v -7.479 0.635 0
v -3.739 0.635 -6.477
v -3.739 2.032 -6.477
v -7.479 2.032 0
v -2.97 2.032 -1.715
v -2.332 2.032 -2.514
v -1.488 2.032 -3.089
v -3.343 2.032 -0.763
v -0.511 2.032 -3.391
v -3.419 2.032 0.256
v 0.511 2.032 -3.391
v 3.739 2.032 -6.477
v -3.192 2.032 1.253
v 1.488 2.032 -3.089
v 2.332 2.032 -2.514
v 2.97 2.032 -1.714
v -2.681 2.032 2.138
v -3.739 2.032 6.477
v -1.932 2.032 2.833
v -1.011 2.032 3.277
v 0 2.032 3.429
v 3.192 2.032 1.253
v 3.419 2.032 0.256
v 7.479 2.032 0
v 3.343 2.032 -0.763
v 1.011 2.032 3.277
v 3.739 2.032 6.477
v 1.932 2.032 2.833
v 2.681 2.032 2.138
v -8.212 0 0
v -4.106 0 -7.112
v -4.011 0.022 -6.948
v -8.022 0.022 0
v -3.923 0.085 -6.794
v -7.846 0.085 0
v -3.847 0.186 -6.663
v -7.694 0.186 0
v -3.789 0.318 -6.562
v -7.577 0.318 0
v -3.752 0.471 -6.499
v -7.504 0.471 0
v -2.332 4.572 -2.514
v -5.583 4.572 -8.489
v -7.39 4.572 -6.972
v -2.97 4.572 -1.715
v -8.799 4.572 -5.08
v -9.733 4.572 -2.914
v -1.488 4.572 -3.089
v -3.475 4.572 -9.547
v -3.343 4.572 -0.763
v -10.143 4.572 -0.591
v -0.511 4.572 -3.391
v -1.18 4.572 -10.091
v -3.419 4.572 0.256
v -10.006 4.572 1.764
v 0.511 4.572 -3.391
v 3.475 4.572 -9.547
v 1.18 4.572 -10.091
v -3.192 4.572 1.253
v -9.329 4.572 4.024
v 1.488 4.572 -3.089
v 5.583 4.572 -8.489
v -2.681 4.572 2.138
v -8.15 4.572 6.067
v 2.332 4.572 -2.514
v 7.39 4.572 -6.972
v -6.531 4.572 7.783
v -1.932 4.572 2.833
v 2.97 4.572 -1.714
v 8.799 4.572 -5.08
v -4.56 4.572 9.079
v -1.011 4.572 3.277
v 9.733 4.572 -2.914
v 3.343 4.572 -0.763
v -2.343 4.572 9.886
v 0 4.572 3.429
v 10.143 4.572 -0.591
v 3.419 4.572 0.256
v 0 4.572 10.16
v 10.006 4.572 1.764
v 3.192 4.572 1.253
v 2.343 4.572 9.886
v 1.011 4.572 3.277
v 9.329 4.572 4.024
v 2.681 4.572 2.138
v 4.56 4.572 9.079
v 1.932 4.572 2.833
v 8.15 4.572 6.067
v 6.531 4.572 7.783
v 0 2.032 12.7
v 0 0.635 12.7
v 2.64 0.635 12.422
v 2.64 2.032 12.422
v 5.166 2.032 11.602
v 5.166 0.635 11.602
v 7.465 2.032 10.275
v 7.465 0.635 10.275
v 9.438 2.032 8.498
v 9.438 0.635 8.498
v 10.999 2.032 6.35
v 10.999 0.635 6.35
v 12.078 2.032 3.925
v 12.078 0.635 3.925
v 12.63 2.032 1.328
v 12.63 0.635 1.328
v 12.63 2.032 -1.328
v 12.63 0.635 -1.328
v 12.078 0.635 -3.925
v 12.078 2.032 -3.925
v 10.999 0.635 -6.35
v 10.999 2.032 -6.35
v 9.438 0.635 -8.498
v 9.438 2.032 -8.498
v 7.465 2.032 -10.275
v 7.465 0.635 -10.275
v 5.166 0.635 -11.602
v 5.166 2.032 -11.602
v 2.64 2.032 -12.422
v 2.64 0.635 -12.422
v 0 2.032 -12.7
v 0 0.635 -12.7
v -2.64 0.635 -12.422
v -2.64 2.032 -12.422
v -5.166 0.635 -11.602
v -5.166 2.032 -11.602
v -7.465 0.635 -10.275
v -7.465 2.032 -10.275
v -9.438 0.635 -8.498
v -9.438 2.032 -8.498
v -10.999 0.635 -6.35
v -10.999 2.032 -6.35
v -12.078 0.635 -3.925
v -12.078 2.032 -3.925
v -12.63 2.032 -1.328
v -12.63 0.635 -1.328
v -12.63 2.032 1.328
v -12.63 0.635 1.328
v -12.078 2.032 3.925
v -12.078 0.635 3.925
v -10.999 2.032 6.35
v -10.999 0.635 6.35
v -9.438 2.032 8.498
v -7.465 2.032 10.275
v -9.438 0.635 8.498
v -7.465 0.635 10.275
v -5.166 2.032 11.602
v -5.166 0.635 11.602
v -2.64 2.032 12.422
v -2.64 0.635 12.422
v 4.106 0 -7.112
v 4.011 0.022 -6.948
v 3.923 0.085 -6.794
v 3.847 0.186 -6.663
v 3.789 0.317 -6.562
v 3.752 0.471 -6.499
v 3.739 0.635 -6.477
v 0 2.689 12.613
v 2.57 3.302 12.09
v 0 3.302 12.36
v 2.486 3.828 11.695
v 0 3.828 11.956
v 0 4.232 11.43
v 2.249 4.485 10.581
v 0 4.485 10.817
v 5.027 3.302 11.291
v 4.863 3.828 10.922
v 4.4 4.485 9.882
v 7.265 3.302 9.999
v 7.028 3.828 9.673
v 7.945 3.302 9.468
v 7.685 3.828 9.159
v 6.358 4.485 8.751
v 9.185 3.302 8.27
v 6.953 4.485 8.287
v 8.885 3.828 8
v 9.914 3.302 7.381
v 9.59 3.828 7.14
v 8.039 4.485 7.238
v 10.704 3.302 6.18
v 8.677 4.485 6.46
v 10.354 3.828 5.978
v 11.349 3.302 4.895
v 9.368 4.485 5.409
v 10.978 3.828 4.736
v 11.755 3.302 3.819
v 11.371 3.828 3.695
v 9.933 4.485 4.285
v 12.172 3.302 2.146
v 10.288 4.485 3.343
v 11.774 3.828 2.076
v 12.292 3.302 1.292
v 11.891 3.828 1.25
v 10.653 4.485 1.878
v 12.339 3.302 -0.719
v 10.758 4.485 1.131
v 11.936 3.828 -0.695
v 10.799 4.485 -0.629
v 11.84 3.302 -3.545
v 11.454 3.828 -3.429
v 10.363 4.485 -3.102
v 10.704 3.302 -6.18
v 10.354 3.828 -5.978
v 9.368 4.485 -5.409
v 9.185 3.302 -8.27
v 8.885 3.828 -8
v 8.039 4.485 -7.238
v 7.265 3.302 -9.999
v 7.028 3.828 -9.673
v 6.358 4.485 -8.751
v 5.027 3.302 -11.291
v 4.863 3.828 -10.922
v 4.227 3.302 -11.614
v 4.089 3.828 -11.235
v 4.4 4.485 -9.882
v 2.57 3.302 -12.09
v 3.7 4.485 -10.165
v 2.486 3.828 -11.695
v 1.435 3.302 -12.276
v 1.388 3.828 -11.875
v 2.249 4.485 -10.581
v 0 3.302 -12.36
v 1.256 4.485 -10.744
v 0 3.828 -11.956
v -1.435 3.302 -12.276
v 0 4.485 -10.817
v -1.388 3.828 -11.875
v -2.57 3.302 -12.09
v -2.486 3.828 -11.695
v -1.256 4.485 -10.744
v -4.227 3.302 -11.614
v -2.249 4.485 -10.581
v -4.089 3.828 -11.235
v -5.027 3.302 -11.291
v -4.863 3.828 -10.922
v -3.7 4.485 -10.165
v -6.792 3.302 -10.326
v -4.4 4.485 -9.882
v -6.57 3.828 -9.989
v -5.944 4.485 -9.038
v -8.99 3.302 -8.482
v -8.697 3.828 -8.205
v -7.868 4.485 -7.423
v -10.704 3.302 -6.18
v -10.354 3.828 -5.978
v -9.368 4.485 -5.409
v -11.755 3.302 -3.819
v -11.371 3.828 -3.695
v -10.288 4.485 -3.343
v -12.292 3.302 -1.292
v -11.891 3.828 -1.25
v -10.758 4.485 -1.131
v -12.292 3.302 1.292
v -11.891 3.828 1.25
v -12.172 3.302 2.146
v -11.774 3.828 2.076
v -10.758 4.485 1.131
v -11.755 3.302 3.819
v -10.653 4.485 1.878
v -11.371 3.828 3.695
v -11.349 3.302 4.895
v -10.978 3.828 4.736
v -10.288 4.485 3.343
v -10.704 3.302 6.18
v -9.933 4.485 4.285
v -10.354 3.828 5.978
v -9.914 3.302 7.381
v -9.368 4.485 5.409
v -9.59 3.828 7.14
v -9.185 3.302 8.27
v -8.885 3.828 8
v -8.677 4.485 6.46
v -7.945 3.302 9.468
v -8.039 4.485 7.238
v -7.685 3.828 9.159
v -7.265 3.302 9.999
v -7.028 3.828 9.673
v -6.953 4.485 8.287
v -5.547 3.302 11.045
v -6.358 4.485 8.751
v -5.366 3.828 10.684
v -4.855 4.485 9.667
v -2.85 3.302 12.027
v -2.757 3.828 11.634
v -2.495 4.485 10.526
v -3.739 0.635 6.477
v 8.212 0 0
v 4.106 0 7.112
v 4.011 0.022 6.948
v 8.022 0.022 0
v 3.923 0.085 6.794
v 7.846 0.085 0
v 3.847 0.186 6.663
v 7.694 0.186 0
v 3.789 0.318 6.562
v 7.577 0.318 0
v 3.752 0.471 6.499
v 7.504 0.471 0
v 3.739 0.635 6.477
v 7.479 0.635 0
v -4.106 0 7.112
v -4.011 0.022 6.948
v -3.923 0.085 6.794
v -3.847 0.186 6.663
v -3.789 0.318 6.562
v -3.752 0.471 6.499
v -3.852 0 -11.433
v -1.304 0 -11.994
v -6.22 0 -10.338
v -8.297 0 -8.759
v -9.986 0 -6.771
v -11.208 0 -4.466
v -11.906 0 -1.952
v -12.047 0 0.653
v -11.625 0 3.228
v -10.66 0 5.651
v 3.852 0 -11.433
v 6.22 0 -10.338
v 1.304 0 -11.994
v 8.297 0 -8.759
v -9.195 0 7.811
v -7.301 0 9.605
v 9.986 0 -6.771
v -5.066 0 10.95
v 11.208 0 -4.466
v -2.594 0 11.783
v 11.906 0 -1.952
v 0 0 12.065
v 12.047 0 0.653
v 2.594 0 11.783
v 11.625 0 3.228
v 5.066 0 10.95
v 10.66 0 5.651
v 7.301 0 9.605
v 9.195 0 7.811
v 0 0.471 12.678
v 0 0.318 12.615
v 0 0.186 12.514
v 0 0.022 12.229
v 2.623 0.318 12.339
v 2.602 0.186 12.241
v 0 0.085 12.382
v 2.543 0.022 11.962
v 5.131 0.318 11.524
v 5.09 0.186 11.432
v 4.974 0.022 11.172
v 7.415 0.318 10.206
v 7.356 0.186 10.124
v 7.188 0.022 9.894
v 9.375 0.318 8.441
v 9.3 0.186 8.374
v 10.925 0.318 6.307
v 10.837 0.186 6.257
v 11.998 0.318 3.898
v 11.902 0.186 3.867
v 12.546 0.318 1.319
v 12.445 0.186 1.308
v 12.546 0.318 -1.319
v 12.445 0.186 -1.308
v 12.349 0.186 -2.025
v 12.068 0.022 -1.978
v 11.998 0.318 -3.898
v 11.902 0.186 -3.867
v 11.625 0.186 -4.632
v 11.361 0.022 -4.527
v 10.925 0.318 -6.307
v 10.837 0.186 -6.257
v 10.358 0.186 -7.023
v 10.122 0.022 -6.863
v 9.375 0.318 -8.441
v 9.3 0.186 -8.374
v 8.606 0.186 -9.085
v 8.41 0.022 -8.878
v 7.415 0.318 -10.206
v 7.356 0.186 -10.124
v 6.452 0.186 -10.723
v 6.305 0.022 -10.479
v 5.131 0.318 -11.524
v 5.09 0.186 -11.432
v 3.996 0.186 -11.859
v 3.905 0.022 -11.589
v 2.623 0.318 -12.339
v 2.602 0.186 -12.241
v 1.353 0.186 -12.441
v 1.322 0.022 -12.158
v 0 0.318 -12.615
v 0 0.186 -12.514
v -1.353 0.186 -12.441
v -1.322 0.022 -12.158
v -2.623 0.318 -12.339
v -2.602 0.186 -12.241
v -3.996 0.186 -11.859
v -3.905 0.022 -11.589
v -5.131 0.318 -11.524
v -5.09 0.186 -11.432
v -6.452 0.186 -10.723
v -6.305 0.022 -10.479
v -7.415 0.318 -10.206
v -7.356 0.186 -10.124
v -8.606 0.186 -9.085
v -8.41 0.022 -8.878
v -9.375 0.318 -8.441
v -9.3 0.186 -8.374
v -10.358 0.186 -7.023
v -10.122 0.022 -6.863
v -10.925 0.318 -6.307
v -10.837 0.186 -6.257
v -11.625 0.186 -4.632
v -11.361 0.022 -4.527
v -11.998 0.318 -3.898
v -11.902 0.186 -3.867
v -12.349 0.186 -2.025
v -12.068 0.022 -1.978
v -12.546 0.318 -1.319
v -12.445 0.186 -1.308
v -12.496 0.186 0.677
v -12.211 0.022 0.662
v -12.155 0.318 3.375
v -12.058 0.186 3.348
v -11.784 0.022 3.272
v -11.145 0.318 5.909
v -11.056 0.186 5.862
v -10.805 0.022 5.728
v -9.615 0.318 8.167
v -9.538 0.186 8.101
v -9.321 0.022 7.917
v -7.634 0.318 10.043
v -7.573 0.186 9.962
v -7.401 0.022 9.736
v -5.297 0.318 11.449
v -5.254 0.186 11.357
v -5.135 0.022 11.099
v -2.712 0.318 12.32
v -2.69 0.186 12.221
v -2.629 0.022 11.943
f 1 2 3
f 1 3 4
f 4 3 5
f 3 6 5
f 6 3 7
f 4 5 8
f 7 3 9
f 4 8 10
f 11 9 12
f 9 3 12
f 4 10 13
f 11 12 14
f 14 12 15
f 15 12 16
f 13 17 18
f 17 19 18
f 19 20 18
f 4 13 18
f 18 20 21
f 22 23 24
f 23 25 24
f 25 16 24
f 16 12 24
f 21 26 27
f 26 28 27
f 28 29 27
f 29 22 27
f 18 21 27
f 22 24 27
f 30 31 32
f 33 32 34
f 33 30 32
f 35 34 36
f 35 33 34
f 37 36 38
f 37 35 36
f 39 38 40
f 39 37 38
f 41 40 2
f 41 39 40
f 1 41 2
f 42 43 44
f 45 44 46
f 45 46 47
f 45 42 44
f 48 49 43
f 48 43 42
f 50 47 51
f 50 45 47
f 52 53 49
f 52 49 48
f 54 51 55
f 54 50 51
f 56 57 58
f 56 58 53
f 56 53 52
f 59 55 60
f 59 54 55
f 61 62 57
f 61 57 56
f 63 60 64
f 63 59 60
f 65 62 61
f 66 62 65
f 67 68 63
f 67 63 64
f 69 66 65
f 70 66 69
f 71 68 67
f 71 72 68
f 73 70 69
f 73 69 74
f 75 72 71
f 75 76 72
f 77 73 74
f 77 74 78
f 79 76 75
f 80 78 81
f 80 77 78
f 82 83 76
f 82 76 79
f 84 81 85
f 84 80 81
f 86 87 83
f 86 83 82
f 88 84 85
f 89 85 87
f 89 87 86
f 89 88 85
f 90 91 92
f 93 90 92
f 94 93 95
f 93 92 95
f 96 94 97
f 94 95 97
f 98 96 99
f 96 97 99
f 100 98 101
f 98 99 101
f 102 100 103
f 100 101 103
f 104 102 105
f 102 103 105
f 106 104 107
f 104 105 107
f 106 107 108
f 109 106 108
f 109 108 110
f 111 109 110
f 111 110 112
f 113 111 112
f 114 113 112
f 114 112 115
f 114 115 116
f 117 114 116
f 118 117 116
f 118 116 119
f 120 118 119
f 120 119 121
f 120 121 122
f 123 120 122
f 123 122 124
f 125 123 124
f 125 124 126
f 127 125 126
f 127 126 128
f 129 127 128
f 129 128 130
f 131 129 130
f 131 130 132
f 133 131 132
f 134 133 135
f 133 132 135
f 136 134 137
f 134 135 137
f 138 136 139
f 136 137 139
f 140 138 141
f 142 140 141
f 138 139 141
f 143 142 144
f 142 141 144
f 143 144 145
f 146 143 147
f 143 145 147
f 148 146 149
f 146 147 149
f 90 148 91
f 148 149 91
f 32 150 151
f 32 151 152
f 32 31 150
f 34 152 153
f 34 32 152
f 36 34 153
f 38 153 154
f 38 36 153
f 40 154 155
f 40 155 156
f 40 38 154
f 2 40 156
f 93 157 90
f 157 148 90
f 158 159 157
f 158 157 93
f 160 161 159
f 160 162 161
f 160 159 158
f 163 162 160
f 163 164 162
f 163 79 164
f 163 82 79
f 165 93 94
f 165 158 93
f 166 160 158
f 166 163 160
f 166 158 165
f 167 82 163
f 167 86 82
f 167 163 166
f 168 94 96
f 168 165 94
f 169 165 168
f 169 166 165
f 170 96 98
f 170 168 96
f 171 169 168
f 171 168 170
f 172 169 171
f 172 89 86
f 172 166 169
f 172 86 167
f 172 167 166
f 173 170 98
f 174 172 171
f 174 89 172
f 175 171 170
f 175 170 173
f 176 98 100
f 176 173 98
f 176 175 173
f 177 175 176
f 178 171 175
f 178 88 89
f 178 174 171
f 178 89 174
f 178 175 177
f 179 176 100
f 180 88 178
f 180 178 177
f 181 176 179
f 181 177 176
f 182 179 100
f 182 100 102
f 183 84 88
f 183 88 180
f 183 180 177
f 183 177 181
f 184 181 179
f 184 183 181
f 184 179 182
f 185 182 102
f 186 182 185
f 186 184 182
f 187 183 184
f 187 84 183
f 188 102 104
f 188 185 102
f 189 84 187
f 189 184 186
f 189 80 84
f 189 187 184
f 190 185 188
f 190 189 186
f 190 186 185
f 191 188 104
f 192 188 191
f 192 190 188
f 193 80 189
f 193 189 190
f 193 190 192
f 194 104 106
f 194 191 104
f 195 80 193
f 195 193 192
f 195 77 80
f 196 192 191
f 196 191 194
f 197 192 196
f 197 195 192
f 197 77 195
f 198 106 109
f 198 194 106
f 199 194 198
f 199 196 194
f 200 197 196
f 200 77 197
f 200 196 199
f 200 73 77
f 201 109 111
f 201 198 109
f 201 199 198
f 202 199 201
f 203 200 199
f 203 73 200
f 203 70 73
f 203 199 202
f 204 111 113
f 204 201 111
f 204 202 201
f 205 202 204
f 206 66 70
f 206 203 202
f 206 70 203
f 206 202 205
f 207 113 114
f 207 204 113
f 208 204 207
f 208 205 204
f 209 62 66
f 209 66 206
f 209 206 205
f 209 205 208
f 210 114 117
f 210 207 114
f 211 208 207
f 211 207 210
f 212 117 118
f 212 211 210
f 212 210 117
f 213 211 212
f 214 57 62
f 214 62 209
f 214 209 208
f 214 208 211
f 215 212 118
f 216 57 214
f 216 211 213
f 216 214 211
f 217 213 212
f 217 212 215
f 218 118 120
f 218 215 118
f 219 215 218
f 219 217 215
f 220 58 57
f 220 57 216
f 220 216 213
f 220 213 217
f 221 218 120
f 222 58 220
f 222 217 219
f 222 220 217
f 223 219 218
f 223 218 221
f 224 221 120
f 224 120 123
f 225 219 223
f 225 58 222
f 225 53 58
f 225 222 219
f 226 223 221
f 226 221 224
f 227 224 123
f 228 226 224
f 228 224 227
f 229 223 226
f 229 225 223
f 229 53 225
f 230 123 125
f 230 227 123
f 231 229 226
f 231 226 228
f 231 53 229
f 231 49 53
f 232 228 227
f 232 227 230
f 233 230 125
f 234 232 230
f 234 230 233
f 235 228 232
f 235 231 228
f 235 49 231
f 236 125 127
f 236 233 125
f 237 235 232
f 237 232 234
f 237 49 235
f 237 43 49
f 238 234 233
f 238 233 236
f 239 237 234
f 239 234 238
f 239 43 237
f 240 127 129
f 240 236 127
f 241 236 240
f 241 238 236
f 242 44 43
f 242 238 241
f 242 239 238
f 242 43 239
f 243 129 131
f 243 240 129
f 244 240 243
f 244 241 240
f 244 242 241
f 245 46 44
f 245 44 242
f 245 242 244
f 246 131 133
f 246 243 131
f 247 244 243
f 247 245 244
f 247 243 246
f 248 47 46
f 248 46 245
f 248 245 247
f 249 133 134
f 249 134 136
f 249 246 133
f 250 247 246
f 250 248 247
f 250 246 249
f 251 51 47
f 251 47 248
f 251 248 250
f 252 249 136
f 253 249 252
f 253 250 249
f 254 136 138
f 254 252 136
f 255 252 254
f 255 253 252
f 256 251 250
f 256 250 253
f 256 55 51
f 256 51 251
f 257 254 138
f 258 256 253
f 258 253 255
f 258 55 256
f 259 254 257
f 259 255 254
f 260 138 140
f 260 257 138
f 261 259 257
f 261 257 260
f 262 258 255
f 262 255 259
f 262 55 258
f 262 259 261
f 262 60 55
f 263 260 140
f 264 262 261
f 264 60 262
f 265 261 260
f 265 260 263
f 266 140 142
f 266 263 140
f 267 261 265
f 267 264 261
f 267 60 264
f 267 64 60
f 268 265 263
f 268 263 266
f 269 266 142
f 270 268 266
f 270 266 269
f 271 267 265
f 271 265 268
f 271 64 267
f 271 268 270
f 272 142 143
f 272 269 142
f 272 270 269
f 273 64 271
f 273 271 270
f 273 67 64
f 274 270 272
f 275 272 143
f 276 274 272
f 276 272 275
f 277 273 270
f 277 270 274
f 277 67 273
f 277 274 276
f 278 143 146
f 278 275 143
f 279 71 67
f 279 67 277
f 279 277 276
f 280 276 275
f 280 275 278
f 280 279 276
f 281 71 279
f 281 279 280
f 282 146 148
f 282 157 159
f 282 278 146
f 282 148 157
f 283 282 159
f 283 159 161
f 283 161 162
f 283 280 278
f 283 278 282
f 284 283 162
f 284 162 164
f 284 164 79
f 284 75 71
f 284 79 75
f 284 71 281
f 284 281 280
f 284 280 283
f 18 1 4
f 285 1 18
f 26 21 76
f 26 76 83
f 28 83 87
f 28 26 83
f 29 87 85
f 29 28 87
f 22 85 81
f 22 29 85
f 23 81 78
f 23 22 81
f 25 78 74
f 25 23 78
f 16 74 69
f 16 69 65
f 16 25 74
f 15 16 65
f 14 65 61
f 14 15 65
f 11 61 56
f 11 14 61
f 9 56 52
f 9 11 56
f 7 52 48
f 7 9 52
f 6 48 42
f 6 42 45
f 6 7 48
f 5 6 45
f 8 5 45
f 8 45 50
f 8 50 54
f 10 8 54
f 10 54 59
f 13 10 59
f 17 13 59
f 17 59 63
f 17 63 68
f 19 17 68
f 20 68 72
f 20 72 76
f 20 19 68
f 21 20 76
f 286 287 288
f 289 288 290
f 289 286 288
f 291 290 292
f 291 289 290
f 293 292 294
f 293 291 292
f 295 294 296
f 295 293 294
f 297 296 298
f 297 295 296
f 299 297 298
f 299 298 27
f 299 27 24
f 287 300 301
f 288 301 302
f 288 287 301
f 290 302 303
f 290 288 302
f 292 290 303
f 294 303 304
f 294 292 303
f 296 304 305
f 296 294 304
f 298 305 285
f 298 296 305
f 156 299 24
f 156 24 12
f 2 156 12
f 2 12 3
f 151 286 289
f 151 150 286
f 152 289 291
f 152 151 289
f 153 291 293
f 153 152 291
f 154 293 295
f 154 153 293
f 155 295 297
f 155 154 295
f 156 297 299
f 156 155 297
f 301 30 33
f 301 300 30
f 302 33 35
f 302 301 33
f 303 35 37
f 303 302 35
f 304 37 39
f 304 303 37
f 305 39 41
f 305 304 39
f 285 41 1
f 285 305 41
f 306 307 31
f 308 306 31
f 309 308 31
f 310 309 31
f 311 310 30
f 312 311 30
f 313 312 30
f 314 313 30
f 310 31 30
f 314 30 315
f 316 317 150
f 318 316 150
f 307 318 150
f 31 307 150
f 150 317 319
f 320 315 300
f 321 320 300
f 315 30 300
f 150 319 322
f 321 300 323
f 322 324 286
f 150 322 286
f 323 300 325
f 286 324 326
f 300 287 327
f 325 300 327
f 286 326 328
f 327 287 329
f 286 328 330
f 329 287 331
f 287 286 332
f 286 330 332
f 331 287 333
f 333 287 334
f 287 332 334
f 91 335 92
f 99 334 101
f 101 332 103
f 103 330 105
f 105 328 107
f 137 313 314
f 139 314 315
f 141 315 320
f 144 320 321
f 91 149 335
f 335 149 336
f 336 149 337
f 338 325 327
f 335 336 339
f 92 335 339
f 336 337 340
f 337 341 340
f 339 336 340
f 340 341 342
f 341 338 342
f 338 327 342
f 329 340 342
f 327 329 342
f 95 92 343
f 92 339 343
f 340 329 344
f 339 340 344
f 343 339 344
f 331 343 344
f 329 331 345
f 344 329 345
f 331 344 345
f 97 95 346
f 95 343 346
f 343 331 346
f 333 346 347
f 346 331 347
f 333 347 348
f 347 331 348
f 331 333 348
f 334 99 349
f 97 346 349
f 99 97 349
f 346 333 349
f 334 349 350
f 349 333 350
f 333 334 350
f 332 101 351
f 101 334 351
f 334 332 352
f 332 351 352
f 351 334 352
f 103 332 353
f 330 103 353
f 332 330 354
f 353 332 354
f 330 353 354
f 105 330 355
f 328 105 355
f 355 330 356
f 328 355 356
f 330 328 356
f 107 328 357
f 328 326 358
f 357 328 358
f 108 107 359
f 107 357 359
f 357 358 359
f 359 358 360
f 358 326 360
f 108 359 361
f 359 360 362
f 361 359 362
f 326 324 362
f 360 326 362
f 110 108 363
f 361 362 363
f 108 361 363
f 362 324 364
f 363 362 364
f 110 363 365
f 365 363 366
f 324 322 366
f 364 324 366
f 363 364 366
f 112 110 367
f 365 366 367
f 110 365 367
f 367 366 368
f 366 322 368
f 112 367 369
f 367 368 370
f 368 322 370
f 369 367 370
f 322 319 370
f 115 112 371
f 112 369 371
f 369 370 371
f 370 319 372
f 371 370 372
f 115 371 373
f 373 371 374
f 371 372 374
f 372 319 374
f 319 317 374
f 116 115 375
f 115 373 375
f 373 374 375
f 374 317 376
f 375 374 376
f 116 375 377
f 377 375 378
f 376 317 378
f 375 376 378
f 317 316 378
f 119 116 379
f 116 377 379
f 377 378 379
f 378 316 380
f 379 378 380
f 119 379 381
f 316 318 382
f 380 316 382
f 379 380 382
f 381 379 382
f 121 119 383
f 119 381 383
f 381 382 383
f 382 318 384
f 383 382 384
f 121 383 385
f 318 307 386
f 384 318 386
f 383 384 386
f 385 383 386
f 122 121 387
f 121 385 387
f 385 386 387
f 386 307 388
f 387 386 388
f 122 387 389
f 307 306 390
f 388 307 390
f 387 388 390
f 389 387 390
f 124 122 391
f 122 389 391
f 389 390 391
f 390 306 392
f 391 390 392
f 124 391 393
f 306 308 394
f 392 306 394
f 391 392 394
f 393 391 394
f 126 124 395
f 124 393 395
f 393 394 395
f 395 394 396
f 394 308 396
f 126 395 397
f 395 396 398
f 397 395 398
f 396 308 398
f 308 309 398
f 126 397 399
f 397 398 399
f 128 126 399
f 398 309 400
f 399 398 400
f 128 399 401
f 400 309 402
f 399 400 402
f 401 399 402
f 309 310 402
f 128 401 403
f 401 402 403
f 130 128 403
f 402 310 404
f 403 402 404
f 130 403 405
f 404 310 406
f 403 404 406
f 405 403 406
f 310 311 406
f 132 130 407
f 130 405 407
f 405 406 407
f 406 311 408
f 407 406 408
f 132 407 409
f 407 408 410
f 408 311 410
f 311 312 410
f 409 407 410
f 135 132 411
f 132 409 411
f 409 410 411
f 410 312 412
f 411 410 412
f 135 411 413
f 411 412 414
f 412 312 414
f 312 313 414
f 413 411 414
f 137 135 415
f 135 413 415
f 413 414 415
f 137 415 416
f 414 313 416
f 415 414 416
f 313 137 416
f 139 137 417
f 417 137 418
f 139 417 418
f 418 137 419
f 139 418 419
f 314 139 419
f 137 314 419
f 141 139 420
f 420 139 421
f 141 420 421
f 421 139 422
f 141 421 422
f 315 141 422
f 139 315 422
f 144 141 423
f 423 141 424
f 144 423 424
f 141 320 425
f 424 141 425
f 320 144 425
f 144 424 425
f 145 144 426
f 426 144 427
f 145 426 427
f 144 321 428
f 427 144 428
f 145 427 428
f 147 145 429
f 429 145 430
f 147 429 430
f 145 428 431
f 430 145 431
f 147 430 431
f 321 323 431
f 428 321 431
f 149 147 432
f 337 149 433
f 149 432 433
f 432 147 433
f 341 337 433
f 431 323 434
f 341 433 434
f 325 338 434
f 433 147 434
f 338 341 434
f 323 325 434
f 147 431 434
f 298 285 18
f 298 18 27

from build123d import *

# Parameters (mm, degrees)
SKETCH1_R           = 12.7
BOSS_EXTRUDE1_DEPTH = 2.032
SKETCH2_R           = 12.7
SKETCH2_R_2         = 3.429
BOSS_EXTRUDE2_DEPTH = 2.54
FILLET1_R           = 2.54
FILLET2_R           = 0.635


with BuildPart() as part:
    # Sketch1 → Boss-Extrude1 (new body)
    with BuildSketch(Plane(origin=(0, 0, 0), x_dir=(1, 0, 0), z_dir=(0, 1, 0))):
        with Locations(Location((0, 0, 0), (0, 0, 270))):
            Circle(SKETCH1_R)
        Polygon((7.478995387, 0), (3.739497694, 6.477), (-3.739497694, 6.477), (-7.478995387, 0), (-3.739497694, -6.477), (3.739497694, -6.477), align=None, mode=Mode.SUBTRACT)
    extrude(amount=BOSS_EXTRUDE1_DEPTH)

    # Sketch2 → Boss-Extrude2 (add)
    with BuildSketch(Plane(origin=(0, 2.032, 0), x_dir=(1, 0, 0), z_dir=(0, 1, 0))):
        with Locations(Location((0, 0, 0), (0, 0, 270))):
            Circle(SKETCH2_R)
        with Locations(Location((0, 0, 0), (0, 0, 270))):
            Circle(SKETCH2_R_2, mode=Mode.SUBTRACT)
    extrude(amount=BOSS_EXTRUDE2_DEPTH)

    # Fillet1
    fillet1_edges = [part.edges().sort_by_distance(p)[0] for p in [
        (0, 4.572, -12.7),
    ]]
    fillet(fillet1_edges, radius=FILLET1_R)

    # Fillet2
    fillet2_edges = [part.edges().sort_by_distance(p)[0] for p in [
        (0, 0, -6.477),
        (-5.60924654, 0, -3.2385),
        (-5.60924654, 0, 3.2385),
        (0, 0, 6.477),
        (0, 0, -12.7),
        (5.60924654, 0, 3.2385),
        (5.60924654, 0, -3.2385),
    ]]
    fillet(fillet2_edges, radius=FILLET2_R)


solid = part.part
